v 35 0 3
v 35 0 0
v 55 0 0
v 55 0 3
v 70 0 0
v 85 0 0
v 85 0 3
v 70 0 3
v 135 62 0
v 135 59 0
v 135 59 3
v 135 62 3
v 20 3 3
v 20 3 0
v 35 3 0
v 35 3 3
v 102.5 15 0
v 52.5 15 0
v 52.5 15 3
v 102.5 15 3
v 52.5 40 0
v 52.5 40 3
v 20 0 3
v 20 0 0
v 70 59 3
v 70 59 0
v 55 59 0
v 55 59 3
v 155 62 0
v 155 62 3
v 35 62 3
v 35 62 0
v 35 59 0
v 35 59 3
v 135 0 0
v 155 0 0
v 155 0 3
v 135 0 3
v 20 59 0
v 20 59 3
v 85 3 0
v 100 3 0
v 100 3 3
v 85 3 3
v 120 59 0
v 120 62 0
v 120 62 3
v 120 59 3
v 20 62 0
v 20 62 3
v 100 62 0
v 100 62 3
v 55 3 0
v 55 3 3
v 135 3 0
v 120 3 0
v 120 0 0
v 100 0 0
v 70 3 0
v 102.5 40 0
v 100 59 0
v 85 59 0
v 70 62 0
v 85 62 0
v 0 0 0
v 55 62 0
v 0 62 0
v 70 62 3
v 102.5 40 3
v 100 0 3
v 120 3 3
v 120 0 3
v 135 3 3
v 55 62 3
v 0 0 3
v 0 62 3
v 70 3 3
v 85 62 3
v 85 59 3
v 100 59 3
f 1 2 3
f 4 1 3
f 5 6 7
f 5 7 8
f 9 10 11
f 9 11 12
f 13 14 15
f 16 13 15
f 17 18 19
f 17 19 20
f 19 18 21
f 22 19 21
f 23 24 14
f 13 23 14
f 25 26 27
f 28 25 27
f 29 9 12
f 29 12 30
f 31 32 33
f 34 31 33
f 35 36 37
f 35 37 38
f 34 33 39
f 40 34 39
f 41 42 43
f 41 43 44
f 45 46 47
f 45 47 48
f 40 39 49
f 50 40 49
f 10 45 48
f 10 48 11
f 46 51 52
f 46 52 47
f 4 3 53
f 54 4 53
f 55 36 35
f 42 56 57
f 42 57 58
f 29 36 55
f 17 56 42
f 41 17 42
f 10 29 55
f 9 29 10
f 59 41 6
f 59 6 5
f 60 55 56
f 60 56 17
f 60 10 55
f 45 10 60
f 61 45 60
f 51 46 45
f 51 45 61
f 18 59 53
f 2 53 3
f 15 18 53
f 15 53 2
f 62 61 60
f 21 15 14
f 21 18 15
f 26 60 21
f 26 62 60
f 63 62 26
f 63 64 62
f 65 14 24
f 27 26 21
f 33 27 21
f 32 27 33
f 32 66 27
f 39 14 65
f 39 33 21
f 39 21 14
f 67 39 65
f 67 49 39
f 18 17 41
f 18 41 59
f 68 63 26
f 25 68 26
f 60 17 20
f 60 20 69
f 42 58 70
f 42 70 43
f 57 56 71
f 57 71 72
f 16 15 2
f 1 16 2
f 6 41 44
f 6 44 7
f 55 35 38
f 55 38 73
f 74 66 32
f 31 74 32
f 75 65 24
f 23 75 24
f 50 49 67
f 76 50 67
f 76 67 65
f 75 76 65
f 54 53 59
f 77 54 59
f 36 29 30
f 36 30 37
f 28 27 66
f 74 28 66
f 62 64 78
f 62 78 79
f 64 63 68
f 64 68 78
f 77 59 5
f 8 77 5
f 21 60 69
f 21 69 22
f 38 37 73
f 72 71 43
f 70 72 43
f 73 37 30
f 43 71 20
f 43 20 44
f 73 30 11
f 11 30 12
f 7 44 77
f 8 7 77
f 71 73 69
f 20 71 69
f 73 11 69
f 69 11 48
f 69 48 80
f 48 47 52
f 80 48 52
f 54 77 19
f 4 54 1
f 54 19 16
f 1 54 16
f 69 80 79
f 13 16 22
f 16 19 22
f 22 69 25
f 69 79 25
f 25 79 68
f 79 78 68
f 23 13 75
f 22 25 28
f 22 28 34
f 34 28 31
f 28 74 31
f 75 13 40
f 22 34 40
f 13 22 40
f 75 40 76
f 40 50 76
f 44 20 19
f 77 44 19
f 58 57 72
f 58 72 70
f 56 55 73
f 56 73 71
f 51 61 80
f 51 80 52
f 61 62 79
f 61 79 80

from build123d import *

# Parameters (mm, degrees)
P_IDAT_VYSUNUT_M1_DEPTH = 3


with BuildPart() as part:
    # Skica1 → Přidat vysunutím1 (new body)
    with BuildSketch(Plane.XY):
        Polygon((20, 3), (35, 3), (35, 0), (55, 0), (55, 3), (70, 3), (70, 0), (77.5, 0), (77.5, 15), (52.5, 15), (52.5, 40), (77.5, 40), (77.5, 62), (70, 62), (70, 59), (55, 59), (55, 62), (35, 62), (35, 59), (20, 59), (20, 62), (0, 62), (0, 0), (20, 0), align=None)
    p_idat_vysunut_m1 = extrude(amount=P_IDAT_VYSUNUT_M1_DEPTH)

    # Zrcadlit1: Přidat vysunutím1 across plane
    add(p_idat_vysunut_m1.mirror(Plane(origin=(77.5, 0, 3), x_dir=(0, 0, 1), z_dir=(-1, 0, 0))))


solid = part.part
